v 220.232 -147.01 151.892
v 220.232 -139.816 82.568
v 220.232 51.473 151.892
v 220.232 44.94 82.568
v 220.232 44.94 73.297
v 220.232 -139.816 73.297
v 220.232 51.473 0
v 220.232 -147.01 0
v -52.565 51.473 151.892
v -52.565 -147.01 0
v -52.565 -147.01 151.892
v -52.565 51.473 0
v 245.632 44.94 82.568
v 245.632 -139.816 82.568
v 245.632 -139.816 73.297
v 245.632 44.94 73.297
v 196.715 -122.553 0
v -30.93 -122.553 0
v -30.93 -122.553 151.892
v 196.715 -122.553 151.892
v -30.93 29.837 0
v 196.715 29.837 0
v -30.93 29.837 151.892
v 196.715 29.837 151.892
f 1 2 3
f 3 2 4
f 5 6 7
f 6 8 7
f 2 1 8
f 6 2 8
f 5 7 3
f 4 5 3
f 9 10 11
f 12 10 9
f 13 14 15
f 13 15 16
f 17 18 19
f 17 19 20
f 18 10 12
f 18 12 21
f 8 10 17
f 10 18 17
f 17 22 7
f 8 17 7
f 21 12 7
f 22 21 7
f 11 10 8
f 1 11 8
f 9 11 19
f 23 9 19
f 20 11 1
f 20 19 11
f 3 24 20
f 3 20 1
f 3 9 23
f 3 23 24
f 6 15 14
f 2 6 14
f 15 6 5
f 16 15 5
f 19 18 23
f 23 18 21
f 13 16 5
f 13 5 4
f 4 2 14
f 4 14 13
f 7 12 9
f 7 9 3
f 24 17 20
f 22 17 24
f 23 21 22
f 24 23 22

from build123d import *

# Parameters (mm, degrees)
F0_W     = 272.797018
F0_H     = 198.48334
F0_W_2   = 227.64441
F0_H_2   = 152.390061
F1_DEPTH = 151.892
F2_W     = 184.755966
F2_H     = 9.270906
F3_DEPTH = 25.4


with BuildPart() as f1:
    # F0 (on Top) → F1 (new body)
    with BuildSketch(Plane.XY):
        with Locations((83.833322, -47.768671)):
            Rectangle(F0_W, F0_H)
        with Locations((82.892643, -46.357654)):
            Rectangle(F0_W_2, F0_H_2, mode=Mode.SUBTRACT)
    extrude(amount=F1_DEPTH)

    # F2 (on face) → F3 (join)
    with BuildSketch(Plane.YZ.offset(220.231831)):
        with Locations((-47.437571, 77.932626)):
            Rectangle(F2_W, F2_H)
    extrude(amount=F3_DEPTH)


solid = f1.part
